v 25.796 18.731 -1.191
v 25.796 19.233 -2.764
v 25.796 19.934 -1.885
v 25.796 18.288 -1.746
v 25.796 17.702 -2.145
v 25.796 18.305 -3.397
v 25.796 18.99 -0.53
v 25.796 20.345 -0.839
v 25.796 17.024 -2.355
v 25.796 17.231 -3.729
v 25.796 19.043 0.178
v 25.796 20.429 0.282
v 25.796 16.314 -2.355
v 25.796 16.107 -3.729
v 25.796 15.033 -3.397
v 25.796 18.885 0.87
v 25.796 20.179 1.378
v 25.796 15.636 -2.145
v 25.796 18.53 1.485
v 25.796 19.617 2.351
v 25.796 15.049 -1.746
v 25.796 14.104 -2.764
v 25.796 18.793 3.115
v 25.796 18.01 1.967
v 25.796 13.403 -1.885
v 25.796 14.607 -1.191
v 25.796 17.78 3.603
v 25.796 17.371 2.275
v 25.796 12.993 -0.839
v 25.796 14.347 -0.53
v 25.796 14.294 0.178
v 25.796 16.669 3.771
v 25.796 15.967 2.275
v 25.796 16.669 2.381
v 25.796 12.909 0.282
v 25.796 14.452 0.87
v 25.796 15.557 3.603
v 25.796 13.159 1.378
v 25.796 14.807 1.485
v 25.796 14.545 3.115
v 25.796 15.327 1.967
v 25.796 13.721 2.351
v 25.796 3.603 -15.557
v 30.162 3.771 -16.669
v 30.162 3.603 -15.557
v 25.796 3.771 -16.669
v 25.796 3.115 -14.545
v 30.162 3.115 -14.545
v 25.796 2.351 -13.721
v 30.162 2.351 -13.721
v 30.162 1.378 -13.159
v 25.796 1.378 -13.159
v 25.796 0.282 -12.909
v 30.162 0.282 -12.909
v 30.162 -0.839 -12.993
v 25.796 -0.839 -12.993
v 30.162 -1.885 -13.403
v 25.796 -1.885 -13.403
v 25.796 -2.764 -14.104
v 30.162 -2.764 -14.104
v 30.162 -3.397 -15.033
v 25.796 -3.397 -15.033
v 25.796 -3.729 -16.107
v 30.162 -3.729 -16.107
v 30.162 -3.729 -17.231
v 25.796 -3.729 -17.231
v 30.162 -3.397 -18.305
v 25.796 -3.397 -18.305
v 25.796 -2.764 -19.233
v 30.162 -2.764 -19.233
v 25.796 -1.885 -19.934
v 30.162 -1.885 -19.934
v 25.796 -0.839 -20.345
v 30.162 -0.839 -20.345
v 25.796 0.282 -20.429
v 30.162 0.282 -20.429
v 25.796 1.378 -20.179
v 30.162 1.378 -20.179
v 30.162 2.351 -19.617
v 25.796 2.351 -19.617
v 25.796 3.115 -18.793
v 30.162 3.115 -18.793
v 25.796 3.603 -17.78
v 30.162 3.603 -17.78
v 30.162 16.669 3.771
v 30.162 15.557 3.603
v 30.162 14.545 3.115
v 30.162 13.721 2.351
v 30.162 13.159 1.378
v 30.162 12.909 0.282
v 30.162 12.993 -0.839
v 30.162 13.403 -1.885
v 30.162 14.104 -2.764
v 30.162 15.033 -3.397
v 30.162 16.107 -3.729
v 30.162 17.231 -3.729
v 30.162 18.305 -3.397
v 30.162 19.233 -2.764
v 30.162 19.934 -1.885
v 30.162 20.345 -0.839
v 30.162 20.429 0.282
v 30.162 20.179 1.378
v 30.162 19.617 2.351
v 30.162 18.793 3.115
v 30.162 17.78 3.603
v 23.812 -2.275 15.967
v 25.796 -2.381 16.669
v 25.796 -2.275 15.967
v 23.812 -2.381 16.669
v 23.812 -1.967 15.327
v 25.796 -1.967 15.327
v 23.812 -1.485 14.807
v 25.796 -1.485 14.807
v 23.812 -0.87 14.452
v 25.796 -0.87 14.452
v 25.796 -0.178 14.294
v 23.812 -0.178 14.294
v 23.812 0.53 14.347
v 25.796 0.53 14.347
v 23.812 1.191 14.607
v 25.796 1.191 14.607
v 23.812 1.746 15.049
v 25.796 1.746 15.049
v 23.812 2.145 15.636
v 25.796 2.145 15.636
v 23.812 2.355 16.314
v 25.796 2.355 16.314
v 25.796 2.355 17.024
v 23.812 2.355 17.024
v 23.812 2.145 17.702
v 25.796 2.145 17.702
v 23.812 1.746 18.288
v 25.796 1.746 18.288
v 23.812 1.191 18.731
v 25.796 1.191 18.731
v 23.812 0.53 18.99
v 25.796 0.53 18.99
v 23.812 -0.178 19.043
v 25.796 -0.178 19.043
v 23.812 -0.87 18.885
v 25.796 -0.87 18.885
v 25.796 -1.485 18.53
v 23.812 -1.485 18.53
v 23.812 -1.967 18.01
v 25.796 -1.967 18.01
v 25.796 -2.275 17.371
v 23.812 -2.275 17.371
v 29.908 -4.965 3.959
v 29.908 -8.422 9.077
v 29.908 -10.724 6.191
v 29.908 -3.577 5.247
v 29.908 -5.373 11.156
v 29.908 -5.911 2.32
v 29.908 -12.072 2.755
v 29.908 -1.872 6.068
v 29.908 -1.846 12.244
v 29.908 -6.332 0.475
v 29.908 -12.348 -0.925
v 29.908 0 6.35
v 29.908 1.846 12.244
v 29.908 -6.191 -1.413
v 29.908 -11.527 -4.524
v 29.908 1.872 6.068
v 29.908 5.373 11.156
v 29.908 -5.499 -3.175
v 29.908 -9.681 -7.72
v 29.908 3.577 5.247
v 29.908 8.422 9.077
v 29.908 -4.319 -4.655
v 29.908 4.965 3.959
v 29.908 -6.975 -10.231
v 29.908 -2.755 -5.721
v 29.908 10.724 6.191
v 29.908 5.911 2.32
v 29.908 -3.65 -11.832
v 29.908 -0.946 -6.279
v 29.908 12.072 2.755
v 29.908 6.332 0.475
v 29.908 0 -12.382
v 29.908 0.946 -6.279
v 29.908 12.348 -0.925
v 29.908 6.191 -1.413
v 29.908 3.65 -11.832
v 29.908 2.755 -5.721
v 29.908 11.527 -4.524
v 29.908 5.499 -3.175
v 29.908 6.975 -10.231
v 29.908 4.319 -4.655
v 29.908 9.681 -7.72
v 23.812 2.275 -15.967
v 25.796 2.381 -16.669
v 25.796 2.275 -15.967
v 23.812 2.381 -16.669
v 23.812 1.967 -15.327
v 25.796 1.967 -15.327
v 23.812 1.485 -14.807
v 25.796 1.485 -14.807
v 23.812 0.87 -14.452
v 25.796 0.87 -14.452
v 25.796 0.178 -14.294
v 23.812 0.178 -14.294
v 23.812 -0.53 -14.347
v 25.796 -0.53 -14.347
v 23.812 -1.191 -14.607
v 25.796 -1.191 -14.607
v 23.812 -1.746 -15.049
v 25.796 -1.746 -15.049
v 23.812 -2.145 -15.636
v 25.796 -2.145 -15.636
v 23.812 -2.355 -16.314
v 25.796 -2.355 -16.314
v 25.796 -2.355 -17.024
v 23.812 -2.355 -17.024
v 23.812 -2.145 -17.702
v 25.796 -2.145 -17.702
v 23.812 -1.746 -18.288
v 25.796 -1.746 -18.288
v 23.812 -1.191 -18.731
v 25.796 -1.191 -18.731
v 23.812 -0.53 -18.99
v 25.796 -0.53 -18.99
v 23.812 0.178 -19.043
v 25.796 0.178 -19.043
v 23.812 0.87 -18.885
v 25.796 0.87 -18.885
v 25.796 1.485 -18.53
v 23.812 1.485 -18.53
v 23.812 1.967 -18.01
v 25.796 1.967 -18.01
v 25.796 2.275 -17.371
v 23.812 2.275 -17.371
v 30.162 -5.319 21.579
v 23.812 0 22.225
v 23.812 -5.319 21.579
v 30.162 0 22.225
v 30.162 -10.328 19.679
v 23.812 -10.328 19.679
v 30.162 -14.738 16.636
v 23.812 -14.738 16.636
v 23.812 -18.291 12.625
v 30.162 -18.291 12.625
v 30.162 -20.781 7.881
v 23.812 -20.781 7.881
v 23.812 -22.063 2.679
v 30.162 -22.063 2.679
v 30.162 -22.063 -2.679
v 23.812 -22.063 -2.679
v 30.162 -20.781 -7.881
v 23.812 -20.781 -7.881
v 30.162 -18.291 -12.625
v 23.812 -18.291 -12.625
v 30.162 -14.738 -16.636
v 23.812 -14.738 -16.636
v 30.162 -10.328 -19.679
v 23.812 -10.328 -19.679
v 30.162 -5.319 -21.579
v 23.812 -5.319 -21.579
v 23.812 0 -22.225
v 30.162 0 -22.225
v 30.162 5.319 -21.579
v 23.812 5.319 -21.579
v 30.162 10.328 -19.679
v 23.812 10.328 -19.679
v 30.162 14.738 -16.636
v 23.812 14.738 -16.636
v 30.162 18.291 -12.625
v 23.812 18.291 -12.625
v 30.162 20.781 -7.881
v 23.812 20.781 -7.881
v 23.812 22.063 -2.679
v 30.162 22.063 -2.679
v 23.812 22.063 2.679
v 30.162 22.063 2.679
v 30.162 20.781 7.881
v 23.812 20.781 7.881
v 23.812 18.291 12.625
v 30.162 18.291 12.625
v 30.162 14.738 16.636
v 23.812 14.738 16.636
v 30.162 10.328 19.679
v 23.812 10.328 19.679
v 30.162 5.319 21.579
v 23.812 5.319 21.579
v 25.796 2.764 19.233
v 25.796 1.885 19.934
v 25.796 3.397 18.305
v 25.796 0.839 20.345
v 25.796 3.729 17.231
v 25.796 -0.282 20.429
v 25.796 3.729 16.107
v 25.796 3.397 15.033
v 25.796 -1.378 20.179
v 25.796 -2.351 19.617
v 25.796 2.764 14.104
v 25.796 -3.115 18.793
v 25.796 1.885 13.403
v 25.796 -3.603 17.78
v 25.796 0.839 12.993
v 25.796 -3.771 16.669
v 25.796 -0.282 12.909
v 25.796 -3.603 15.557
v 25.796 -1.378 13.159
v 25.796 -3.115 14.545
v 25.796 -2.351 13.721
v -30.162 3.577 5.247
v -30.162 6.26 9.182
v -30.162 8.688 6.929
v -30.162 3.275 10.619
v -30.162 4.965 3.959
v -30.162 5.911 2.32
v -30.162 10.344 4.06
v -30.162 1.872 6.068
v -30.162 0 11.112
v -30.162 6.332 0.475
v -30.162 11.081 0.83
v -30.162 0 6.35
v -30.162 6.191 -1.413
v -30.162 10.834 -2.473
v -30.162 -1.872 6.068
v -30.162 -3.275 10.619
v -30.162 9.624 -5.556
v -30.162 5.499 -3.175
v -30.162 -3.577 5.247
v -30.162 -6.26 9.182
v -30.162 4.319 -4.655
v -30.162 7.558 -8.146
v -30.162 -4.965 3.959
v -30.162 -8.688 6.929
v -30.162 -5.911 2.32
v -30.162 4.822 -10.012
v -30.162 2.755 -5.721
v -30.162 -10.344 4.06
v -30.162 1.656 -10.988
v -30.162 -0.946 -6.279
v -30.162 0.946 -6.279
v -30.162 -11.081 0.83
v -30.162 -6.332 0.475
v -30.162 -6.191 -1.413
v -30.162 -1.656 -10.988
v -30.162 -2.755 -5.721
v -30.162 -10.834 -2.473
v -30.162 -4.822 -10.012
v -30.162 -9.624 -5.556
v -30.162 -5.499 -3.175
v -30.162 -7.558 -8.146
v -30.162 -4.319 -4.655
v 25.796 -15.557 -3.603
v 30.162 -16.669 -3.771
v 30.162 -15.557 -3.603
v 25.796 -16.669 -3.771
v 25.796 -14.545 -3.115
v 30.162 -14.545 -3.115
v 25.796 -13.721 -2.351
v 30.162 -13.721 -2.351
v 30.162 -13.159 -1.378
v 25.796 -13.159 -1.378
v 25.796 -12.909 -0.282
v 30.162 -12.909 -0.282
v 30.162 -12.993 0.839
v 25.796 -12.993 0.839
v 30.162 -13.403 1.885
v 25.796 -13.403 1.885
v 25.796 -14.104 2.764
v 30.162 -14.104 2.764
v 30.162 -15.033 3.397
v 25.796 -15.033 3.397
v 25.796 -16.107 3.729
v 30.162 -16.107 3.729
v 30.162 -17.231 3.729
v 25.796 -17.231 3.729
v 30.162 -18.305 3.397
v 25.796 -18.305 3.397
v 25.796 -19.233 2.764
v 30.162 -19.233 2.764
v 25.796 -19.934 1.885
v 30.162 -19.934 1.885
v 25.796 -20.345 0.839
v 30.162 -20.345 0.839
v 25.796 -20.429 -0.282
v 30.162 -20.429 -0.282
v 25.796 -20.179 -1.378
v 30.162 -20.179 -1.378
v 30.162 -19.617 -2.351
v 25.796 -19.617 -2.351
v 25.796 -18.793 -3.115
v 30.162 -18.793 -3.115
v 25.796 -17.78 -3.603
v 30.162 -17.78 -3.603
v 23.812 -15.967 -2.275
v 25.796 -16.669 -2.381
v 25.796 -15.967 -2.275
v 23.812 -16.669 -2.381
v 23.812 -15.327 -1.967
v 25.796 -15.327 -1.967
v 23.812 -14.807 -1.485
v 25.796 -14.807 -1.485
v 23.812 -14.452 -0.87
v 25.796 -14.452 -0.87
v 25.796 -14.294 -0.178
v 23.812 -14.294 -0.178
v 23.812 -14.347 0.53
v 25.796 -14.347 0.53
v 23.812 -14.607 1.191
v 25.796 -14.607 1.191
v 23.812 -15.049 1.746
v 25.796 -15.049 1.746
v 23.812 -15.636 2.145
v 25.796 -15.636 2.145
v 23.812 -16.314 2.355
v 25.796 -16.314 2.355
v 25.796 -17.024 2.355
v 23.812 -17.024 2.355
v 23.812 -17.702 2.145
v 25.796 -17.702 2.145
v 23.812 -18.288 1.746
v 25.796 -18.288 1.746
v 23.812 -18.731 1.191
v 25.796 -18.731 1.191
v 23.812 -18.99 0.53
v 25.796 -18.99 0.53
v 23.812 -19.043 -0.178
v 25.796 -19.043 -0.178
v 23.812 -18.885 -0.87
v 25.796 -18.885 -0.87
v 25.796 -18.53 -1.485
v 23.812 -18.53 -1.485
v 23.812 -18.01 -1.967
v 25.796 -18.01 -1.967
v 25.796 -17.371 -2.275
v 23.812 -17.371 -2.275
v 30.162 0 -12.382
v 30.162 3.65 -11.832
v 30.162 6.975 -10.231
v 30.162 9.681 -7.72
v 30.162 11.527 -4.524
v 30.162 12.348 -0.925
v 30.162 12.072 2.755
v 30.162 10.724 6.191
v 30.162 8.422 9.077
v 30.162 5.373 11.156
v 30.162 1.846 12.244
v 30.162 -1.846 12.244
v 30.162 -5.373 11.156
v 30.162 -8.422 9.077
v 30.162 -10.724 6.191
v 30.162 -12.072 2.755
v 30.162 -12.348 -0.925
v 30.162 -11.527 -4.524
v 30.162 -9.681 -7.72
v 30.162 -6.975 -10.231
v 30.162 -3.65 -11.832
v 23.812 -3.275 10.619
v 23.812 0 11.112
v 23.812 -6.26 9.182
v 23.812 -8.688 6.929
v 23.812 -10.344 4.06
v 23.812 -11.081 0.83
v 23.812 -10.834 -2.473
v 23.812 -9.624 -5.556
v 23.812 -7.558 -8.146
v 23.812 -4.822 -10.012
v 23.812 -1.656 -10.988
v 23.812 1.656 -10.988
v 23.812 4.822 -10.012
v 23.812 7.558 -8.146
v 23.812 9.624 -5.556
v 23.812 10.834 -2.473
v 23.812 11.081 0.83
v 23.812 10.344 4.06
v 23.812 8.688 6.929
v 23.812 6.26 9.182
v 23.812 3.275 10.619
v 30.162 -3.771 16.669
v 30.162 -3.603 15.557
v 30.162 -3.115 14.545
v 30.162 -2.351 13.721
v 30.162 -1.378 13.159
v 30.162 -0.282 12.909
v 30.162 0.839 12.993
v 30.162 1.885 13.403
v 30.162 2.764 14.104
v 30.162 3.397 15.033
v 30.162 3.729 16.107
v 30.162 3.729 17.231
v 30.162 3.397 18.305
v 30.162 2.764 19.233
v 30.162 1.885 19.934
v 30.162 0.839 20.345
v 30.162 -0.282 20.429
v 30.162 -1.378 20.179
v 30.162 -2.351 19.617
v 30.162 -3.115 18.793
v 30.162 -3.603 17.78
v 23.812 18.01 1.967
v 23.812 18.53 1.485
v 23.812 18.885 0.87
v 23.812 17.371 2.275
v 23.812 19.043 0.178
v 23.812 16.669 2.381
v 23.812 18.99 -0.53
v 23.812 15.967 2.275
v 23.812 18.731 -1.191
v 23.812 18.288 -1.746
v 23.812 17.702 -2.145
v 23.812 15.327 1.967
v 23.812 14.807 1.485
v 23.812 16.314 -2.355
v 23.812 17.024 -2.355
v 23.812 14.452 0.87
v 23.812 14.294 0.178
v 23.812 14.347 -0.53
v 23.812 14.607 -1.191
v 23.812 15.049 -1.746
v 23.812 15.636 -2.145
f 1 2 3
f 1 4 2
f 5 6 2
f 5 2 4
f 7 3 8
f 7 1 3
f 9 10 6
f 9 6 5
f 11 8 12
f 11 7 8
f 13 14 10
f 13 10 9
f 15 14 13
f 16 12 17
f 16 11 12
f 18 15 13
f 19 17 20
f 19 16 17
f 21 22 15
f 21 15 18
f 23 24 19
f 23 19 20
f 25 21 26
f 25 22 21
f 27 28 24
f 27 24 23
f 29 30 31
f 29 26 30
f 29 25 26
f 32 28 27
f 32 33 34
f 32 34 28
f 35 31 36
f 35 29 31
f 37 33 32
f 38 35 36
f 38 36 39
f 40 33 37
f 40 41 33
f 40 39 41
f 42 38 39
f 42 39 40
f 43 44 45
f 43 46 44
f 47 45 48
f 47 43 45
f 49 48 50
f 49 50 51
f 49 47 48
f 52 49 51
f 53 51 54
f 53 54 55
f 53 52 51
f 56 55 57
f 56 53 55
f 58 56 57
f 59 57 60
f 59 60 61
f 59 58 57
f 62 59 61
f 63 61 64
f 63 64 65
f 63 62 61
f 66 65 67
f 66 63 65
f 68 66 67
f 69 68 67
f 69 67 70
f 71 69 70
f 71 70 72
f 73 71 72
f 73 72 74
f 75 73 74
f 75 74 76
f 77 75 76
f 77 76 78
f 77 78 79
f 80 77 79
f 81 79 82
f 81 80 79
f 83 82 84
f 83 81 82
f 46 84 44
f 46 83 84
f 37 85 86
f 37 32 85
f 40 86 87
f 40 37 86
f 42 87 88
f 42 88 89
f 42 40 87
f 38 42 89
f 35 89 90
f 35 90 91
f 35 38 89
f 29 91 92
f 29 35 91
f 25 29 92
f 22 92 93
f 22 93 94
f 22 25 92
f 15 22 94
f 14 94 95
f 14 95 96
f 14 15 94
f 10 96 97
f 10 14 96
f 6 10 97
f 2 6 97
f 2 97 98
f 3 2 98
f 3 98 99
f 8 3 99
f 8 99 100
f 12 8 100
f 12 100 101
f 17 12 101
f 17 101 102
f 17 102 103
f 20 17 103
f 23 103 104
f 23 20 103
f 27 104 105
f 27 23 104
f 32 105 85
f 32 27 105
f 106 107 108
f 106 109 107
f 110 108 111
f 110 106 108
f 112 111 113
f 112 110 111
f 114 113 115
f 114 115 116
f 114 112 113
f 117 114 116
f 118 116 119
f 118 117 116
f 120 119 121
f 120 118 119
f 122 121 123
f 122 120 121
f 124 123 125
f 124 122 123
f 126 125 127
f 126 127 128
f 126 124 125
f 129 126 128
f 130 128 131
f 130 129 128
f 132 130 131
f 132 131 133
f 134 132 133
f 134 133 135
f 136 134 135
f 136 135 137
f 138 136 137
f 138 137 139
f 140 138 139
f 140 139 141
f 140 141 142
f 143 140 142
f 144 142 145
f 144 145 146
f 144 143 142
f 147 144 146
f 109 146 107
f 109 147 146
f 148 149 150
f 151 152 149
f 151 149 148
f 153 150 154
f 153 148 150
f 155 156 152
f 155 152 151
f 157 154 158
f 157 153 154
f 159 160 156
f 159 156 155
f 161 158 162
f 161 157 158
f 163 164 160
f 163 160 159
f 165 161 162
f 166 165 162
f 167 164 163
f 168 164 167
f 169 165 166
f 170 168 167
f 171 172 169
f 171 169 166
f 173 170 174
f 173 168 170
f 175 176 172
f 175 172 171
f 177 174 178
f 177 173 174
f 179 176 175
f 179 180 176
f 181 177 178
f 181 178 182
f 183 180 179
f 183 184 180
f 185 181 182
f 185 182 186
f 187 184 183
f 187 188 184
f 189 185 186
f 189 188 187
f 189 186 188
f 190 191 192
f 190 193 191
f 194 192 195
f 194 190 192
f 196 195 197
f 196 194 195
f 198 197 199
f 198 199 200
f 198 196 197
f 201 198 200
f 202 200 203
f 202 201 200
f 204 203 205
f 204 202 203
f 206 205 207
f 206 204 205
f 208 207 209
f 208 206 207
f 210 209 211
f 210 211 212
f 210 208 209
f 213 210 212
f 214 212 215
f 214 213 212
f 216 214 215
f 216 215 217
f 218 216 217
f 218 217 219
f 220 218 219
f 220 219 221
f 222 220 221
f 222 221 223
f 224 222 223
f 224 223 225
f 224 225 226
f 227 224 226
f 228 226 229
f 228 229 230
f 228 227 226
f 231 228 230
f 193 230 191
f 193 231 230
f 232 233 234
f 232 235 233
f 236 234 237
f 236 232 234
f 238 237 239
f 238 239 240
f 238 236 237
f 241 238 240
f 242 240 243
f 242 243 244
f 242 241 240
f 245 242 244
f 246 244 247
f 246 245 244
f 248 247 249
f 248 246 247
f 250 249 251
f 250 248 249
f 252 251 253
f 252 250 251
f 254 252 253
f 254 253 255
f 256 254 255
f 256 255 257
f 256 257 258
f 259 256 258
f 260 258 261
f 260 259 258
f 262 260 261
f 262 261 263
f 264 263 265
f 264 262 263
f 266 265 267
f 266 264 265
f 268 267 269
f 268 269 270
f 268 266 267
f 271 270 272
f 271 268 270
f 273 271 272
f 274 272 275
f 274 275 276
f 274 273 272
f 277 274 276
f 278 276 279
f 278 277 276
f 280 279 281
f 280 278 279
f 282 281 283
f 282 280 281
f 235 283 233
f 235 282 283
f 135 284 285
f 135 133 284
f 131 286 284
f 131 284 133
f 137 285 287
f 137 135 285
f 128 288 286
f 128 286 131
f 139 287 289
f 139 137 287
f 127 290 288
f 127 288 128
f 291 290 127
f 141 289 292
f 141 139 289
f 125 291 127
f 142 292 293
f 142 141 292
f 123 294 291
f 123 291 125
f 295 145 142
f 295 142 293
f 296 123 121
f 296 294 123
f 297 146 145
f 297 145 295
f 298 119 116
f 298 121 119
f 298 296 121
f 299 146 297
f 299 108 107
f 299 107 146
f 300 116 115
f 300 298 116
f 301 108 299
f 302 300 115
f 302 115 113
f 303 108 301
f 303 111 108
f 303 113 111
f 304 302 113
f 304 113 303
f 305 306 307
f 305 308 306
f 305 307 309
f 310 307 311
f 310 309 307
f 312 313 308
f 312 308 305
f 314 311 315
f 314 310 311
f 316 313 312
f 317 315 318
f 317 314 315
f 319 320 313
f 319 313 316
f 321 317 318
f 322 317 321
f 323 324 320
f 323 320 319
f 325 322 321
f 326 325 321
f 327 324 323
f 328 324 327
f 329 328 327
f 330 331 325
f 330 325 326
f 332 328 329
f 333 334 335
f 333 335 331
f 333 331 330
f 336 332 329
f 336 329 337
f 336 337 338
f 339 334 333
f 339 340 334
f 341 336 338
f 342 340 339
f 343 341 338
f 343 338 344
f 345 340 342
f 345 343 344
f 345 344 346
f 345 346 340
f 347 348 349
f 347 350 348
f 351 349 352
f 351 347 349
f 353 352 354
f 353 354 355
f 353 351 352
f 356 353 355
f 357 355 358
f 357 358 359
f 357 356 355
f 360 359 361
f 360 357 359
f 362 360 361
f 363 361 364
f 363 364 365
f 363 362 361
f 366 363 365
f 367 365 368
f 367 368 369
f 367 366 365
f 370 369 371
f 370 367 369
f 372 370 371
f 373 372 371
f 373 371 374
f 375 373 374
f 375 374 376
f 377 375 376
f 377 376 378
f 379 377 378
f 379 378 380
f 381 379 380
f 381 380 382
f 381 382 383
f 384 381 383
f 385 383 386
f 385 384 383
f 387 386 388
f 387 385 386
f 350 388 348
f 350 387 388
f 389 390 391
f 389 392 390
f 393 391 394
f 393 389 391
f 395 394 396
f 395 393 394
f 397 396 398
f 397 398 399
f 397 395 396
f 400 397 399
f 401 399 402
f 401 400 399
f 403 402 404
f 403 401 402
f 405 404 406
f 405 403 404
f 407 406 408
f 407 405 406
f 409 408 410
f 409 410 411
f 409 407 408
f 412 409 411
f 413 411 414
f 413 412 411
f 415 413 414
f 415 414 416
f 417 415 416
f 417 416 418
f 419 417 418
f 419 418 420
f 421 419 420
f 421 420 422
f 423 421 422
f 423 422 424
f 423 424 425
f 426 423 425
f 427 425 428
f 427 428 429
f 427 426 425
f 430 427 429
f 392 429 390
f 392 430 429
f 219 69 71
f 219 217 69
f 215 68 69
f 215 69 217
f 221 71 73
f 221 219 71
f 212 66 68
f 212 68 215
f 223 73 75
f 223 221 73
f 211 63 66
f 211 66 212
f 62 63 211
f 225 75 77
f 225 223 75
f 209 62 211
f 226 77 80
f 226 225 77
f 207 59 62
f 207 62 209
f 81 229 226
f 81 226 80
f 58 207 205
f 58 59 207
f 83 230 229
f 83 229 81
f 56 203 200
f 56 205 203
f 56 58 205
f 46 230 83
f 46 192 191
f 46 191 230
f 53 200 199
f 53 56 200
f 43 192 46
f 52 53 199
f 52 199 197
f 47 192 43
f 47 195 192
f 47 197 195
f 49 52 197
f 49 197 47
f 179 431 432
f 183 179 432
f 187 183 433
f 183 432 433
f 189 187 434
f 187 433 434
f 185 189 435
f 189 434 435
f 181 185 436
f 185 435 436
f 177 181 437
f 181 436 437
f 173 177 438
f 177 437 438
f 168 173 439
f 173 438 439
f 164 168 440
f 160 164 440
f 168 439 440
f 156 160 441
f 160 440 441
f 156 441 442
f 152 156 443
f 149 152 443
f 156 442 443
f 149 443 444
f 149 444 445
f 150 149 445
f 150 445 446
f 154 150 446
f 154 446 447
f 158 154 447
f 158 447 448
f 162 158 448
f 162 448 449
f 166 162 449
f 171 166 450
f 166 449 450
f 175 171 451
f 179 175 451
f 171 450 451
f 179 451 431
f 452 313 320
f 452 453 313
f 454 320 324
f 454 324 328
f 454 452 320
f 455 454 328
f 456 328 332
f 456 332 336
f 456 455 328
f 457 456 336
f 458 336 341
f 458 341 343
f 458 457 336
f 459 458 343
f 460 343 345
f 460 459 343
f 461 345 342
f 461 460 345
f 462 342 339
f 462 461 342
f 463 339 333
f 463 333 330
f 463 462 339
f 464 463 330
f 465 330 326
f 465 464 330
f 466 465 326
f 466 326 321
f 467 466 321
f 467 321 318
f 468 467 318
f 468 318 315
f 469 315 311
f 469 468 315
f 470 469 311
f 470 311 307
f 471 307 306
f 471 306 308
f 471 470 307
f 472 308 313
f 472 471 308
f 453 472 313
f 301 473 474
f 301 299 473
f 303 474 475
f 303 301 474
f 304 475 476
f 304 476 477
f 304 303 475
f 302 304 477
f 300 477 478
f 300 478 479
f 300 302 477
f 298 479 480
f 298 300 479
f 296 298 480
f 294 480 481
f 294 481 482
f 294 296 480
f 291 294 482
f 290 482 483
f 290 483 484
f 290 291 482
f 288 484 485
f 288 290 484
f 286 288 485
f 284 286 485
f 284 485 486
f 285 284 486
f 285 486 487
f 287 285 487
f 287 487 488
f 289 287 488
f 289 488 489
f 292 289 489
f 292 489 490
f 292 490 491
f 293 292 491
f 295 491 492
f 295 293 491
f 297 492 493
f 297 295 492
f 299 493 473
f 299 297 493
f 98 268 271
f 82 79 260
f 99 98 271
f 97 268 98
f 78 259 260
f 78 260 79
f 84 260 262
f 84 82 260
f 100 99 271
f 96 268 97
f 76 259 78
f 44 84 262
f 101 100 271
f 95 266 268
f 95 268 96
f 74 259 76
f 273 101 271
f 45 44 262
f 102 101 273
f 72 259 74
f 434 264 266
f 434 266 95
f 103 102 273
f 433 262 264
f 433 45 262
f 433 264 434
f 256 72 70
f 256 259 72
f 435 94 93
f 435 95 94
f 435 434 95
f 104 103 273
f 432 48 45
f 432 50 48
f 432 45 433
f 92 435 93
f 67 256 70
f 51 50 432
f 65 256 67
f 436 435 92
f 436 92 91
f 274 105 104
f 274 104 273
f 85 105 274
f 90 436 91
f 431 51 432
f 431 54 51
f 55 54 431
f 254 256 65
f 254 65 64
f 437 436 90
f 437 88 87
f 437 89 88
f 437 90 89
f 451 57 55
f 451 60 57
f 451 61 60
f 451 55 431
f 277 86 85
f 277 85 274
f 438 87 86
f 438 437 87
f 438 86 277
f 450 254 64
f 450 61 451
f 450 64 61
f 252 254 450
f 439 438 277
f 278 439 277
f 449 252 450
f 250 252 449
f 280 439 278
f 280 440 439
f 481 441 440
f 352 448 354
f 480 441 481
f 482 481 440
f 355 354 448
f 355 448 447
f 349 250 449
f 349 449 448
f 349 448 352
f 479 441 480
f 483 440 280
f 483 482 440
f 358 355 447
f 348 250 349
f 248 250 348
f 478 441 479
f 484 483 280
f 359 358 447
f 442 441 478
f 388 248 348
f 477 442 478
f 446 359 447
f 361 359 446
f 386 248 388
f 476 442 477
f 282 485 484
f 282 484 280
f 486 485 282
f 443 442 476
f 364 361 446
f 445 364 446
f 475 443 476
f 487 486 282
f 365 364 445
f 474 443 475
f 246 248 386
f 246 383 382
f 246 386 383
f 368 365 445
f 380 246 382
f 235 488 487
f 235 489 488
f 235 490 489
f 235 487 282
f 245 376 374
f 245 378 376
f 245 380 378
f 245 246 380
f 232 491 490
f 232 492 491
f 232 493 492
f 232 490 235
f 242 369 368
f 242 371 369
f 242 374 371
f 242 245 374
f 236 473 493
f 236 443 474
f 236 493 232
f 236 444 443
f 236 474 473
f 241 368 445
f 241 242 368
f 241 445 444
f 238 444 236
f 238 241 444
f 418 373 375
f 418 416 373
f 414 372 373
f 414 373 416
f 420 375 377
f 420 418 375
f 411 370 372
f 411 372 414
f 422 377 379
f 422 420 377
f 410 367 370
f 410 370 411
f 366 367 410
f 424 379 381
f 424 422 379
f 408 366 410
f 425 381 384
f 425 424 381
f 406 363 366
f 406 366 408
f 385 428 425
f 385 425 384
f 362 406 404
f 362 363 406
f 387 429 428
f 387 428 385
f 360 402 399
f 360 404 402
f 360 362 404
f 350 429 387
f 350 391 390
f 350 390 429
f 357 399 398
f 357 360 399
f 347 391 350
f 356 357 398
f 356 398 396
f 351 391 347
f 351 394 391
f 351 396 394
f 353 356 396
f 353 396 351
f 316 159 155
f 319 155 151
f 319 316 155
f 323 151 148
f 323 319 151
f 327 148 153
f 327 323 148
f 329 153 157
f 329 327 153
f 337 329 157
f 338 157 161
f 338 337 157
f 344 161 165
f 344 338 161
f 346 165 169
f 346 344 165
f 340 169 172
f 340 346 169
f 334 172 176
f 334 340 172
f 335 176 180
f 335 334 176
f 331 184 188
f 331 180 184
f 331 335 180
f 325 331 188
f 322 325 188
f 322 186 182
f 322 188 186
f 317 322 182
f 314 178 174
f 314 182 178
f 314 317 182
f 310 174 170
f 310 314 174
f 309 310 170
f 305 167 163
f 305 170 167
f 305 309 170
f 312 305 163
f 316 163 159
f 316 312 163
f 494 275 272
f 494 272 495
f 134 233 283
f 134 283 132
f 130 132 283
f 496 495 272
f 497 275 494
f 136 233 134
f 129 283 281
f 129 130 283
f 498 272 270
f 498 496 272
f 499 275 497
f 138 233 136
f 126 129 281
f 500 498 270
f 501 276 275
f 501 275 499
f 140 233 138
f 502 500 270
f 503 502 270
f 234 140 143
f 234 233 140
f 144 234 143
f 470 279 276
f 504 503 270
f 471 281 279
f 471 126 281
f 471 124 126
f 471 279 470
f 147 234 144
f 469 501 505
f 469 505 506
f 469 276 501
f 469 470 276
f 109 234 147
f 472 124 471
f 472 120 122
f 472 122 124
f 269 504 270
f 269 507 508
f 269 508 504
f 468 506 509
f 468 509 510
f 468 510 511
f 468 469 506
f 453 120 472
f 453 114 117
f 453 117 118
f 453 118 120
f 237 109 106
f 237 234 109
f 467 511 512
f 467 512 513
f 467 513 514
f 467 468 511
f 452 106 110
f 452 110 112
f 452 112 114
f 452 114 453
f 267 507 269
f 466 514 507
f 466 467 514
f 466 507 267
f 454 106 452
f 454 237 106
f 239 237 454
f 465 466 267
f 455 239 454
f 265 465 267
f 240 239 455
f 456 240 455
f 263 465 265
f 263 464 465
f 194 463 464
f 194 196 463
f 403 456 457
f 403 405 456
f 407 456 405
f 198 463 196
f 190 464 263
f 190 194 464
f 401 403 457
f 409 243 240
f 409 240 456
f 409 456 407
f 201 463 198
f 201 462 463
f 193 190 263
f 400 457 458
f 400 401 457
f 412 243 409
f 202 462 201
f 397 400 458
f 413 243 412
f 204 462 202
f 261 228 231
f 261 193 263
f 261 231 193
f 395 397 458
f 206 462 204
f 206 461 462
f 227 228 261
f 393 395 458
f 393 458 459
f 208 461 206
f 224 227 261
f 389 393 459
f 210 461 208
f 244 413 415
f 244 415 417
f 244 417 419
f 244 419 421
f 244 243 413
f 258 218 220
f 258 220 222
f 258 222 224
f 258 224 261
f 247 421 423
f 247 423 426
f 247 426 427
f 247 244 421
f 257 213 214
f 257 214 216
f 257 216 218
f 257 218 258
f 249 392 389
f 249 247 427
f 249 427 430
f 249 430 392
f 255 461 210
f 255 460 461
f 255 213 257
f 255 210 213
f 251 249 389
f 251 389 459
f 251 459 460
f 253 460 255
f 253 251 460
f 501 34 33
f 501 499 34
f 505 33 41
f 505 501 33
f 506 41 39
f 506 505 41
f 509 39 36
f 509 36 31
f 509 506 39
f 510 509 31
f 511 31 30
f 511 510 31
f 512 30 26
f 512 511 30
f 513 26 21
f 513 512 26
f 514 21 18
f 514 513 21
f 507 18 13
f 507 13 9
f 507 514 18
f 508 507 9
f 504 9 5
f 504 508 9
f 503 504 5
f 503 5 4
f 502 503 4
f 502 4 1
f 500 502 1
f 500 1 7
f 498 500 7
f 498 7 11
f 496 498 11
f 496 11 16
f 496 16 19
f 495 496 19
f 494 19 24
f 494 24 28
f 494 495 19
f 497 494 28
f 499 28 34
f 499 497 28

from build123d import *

# Parameters (mm, degrees)
MOUNTING_HOLE_PATTERN_COUNT = 4
SKETCH9_R                   = 12.3825
SHAFT_DIA_DEPTH             = 0.254


with BuildPart() as part:
    # Sketch1 → BASE-FLANGE (revolve)
    with BuildSketch(Plane.XY, mode=Mode.PRIVATE) as base_flange_sk:
        Polygon((-30.1625, -11.1125), (23.8125, -11.1125), (23.8125, -22.225), (30.1625, -22.225), (30.1625, -6.35), (-30.1625, -6.35), align=None)
    revolve(base_flange_sk.sketch.rotate(Axis((-10.390811595, 0, 0), (1, 0, 0)), 270), axis=Axis((-10.390811595, 0, 0), (1, 0, 0)))  # turned: the seam where the file's is

    # Sketch10 → MOUNTING-HOLE (revolve, cut)
    with BuildSketch(Plane.XY, mode=Mode.PRIVATE) as mounting_hole_sk:
        Polygon((30.1625, 20.43938), (25.79624, 20.43938), (25.79624, 19.05), (23.8125, 19.05), (23.8125, 16.66875), (30.1625, 16.66875), align=None)
    mounting_hole = revolve(mounting_hole_sk.sketch.rotate(Axis((7.205320248, 16.66875, 0), (1, 0, 0)), 90), axis=Axis((7.205320248, 16.66875, 0), (1, 0, 0)), mode=Mode.SUBTRACT)  # turned: the seam where the file's is

    # MOUNTING-HOLE PATTERN: MOUNTING-HOLE ×4 about axis
    mounting_hole_pattern_axis = Axis((0, 0, 0), (1, 0, 0))
    for i in range(1, MOUNTING_HOLE_PATTERN_COUNT):
        add(mounting_hole.rotate(mounting_hole_pattern_axis, i * 360 / MOUNTING_HOLE_PATTERN_COUNT), mode=Mode.SUBTRACT)

    # Sketch9 → SHAFT DIA (cut)
    with BuildSketch(Plane(origin=(30.1625, 0, 0), x_dir=(0, 0, -1), z_dir=(1, 0, 0))):
        Circle(SKETCH9_R)
    extrude(amount=-SHAFT_DIA_DEPTH, mode=Mode.SUBTRACT)


solid = part.part
